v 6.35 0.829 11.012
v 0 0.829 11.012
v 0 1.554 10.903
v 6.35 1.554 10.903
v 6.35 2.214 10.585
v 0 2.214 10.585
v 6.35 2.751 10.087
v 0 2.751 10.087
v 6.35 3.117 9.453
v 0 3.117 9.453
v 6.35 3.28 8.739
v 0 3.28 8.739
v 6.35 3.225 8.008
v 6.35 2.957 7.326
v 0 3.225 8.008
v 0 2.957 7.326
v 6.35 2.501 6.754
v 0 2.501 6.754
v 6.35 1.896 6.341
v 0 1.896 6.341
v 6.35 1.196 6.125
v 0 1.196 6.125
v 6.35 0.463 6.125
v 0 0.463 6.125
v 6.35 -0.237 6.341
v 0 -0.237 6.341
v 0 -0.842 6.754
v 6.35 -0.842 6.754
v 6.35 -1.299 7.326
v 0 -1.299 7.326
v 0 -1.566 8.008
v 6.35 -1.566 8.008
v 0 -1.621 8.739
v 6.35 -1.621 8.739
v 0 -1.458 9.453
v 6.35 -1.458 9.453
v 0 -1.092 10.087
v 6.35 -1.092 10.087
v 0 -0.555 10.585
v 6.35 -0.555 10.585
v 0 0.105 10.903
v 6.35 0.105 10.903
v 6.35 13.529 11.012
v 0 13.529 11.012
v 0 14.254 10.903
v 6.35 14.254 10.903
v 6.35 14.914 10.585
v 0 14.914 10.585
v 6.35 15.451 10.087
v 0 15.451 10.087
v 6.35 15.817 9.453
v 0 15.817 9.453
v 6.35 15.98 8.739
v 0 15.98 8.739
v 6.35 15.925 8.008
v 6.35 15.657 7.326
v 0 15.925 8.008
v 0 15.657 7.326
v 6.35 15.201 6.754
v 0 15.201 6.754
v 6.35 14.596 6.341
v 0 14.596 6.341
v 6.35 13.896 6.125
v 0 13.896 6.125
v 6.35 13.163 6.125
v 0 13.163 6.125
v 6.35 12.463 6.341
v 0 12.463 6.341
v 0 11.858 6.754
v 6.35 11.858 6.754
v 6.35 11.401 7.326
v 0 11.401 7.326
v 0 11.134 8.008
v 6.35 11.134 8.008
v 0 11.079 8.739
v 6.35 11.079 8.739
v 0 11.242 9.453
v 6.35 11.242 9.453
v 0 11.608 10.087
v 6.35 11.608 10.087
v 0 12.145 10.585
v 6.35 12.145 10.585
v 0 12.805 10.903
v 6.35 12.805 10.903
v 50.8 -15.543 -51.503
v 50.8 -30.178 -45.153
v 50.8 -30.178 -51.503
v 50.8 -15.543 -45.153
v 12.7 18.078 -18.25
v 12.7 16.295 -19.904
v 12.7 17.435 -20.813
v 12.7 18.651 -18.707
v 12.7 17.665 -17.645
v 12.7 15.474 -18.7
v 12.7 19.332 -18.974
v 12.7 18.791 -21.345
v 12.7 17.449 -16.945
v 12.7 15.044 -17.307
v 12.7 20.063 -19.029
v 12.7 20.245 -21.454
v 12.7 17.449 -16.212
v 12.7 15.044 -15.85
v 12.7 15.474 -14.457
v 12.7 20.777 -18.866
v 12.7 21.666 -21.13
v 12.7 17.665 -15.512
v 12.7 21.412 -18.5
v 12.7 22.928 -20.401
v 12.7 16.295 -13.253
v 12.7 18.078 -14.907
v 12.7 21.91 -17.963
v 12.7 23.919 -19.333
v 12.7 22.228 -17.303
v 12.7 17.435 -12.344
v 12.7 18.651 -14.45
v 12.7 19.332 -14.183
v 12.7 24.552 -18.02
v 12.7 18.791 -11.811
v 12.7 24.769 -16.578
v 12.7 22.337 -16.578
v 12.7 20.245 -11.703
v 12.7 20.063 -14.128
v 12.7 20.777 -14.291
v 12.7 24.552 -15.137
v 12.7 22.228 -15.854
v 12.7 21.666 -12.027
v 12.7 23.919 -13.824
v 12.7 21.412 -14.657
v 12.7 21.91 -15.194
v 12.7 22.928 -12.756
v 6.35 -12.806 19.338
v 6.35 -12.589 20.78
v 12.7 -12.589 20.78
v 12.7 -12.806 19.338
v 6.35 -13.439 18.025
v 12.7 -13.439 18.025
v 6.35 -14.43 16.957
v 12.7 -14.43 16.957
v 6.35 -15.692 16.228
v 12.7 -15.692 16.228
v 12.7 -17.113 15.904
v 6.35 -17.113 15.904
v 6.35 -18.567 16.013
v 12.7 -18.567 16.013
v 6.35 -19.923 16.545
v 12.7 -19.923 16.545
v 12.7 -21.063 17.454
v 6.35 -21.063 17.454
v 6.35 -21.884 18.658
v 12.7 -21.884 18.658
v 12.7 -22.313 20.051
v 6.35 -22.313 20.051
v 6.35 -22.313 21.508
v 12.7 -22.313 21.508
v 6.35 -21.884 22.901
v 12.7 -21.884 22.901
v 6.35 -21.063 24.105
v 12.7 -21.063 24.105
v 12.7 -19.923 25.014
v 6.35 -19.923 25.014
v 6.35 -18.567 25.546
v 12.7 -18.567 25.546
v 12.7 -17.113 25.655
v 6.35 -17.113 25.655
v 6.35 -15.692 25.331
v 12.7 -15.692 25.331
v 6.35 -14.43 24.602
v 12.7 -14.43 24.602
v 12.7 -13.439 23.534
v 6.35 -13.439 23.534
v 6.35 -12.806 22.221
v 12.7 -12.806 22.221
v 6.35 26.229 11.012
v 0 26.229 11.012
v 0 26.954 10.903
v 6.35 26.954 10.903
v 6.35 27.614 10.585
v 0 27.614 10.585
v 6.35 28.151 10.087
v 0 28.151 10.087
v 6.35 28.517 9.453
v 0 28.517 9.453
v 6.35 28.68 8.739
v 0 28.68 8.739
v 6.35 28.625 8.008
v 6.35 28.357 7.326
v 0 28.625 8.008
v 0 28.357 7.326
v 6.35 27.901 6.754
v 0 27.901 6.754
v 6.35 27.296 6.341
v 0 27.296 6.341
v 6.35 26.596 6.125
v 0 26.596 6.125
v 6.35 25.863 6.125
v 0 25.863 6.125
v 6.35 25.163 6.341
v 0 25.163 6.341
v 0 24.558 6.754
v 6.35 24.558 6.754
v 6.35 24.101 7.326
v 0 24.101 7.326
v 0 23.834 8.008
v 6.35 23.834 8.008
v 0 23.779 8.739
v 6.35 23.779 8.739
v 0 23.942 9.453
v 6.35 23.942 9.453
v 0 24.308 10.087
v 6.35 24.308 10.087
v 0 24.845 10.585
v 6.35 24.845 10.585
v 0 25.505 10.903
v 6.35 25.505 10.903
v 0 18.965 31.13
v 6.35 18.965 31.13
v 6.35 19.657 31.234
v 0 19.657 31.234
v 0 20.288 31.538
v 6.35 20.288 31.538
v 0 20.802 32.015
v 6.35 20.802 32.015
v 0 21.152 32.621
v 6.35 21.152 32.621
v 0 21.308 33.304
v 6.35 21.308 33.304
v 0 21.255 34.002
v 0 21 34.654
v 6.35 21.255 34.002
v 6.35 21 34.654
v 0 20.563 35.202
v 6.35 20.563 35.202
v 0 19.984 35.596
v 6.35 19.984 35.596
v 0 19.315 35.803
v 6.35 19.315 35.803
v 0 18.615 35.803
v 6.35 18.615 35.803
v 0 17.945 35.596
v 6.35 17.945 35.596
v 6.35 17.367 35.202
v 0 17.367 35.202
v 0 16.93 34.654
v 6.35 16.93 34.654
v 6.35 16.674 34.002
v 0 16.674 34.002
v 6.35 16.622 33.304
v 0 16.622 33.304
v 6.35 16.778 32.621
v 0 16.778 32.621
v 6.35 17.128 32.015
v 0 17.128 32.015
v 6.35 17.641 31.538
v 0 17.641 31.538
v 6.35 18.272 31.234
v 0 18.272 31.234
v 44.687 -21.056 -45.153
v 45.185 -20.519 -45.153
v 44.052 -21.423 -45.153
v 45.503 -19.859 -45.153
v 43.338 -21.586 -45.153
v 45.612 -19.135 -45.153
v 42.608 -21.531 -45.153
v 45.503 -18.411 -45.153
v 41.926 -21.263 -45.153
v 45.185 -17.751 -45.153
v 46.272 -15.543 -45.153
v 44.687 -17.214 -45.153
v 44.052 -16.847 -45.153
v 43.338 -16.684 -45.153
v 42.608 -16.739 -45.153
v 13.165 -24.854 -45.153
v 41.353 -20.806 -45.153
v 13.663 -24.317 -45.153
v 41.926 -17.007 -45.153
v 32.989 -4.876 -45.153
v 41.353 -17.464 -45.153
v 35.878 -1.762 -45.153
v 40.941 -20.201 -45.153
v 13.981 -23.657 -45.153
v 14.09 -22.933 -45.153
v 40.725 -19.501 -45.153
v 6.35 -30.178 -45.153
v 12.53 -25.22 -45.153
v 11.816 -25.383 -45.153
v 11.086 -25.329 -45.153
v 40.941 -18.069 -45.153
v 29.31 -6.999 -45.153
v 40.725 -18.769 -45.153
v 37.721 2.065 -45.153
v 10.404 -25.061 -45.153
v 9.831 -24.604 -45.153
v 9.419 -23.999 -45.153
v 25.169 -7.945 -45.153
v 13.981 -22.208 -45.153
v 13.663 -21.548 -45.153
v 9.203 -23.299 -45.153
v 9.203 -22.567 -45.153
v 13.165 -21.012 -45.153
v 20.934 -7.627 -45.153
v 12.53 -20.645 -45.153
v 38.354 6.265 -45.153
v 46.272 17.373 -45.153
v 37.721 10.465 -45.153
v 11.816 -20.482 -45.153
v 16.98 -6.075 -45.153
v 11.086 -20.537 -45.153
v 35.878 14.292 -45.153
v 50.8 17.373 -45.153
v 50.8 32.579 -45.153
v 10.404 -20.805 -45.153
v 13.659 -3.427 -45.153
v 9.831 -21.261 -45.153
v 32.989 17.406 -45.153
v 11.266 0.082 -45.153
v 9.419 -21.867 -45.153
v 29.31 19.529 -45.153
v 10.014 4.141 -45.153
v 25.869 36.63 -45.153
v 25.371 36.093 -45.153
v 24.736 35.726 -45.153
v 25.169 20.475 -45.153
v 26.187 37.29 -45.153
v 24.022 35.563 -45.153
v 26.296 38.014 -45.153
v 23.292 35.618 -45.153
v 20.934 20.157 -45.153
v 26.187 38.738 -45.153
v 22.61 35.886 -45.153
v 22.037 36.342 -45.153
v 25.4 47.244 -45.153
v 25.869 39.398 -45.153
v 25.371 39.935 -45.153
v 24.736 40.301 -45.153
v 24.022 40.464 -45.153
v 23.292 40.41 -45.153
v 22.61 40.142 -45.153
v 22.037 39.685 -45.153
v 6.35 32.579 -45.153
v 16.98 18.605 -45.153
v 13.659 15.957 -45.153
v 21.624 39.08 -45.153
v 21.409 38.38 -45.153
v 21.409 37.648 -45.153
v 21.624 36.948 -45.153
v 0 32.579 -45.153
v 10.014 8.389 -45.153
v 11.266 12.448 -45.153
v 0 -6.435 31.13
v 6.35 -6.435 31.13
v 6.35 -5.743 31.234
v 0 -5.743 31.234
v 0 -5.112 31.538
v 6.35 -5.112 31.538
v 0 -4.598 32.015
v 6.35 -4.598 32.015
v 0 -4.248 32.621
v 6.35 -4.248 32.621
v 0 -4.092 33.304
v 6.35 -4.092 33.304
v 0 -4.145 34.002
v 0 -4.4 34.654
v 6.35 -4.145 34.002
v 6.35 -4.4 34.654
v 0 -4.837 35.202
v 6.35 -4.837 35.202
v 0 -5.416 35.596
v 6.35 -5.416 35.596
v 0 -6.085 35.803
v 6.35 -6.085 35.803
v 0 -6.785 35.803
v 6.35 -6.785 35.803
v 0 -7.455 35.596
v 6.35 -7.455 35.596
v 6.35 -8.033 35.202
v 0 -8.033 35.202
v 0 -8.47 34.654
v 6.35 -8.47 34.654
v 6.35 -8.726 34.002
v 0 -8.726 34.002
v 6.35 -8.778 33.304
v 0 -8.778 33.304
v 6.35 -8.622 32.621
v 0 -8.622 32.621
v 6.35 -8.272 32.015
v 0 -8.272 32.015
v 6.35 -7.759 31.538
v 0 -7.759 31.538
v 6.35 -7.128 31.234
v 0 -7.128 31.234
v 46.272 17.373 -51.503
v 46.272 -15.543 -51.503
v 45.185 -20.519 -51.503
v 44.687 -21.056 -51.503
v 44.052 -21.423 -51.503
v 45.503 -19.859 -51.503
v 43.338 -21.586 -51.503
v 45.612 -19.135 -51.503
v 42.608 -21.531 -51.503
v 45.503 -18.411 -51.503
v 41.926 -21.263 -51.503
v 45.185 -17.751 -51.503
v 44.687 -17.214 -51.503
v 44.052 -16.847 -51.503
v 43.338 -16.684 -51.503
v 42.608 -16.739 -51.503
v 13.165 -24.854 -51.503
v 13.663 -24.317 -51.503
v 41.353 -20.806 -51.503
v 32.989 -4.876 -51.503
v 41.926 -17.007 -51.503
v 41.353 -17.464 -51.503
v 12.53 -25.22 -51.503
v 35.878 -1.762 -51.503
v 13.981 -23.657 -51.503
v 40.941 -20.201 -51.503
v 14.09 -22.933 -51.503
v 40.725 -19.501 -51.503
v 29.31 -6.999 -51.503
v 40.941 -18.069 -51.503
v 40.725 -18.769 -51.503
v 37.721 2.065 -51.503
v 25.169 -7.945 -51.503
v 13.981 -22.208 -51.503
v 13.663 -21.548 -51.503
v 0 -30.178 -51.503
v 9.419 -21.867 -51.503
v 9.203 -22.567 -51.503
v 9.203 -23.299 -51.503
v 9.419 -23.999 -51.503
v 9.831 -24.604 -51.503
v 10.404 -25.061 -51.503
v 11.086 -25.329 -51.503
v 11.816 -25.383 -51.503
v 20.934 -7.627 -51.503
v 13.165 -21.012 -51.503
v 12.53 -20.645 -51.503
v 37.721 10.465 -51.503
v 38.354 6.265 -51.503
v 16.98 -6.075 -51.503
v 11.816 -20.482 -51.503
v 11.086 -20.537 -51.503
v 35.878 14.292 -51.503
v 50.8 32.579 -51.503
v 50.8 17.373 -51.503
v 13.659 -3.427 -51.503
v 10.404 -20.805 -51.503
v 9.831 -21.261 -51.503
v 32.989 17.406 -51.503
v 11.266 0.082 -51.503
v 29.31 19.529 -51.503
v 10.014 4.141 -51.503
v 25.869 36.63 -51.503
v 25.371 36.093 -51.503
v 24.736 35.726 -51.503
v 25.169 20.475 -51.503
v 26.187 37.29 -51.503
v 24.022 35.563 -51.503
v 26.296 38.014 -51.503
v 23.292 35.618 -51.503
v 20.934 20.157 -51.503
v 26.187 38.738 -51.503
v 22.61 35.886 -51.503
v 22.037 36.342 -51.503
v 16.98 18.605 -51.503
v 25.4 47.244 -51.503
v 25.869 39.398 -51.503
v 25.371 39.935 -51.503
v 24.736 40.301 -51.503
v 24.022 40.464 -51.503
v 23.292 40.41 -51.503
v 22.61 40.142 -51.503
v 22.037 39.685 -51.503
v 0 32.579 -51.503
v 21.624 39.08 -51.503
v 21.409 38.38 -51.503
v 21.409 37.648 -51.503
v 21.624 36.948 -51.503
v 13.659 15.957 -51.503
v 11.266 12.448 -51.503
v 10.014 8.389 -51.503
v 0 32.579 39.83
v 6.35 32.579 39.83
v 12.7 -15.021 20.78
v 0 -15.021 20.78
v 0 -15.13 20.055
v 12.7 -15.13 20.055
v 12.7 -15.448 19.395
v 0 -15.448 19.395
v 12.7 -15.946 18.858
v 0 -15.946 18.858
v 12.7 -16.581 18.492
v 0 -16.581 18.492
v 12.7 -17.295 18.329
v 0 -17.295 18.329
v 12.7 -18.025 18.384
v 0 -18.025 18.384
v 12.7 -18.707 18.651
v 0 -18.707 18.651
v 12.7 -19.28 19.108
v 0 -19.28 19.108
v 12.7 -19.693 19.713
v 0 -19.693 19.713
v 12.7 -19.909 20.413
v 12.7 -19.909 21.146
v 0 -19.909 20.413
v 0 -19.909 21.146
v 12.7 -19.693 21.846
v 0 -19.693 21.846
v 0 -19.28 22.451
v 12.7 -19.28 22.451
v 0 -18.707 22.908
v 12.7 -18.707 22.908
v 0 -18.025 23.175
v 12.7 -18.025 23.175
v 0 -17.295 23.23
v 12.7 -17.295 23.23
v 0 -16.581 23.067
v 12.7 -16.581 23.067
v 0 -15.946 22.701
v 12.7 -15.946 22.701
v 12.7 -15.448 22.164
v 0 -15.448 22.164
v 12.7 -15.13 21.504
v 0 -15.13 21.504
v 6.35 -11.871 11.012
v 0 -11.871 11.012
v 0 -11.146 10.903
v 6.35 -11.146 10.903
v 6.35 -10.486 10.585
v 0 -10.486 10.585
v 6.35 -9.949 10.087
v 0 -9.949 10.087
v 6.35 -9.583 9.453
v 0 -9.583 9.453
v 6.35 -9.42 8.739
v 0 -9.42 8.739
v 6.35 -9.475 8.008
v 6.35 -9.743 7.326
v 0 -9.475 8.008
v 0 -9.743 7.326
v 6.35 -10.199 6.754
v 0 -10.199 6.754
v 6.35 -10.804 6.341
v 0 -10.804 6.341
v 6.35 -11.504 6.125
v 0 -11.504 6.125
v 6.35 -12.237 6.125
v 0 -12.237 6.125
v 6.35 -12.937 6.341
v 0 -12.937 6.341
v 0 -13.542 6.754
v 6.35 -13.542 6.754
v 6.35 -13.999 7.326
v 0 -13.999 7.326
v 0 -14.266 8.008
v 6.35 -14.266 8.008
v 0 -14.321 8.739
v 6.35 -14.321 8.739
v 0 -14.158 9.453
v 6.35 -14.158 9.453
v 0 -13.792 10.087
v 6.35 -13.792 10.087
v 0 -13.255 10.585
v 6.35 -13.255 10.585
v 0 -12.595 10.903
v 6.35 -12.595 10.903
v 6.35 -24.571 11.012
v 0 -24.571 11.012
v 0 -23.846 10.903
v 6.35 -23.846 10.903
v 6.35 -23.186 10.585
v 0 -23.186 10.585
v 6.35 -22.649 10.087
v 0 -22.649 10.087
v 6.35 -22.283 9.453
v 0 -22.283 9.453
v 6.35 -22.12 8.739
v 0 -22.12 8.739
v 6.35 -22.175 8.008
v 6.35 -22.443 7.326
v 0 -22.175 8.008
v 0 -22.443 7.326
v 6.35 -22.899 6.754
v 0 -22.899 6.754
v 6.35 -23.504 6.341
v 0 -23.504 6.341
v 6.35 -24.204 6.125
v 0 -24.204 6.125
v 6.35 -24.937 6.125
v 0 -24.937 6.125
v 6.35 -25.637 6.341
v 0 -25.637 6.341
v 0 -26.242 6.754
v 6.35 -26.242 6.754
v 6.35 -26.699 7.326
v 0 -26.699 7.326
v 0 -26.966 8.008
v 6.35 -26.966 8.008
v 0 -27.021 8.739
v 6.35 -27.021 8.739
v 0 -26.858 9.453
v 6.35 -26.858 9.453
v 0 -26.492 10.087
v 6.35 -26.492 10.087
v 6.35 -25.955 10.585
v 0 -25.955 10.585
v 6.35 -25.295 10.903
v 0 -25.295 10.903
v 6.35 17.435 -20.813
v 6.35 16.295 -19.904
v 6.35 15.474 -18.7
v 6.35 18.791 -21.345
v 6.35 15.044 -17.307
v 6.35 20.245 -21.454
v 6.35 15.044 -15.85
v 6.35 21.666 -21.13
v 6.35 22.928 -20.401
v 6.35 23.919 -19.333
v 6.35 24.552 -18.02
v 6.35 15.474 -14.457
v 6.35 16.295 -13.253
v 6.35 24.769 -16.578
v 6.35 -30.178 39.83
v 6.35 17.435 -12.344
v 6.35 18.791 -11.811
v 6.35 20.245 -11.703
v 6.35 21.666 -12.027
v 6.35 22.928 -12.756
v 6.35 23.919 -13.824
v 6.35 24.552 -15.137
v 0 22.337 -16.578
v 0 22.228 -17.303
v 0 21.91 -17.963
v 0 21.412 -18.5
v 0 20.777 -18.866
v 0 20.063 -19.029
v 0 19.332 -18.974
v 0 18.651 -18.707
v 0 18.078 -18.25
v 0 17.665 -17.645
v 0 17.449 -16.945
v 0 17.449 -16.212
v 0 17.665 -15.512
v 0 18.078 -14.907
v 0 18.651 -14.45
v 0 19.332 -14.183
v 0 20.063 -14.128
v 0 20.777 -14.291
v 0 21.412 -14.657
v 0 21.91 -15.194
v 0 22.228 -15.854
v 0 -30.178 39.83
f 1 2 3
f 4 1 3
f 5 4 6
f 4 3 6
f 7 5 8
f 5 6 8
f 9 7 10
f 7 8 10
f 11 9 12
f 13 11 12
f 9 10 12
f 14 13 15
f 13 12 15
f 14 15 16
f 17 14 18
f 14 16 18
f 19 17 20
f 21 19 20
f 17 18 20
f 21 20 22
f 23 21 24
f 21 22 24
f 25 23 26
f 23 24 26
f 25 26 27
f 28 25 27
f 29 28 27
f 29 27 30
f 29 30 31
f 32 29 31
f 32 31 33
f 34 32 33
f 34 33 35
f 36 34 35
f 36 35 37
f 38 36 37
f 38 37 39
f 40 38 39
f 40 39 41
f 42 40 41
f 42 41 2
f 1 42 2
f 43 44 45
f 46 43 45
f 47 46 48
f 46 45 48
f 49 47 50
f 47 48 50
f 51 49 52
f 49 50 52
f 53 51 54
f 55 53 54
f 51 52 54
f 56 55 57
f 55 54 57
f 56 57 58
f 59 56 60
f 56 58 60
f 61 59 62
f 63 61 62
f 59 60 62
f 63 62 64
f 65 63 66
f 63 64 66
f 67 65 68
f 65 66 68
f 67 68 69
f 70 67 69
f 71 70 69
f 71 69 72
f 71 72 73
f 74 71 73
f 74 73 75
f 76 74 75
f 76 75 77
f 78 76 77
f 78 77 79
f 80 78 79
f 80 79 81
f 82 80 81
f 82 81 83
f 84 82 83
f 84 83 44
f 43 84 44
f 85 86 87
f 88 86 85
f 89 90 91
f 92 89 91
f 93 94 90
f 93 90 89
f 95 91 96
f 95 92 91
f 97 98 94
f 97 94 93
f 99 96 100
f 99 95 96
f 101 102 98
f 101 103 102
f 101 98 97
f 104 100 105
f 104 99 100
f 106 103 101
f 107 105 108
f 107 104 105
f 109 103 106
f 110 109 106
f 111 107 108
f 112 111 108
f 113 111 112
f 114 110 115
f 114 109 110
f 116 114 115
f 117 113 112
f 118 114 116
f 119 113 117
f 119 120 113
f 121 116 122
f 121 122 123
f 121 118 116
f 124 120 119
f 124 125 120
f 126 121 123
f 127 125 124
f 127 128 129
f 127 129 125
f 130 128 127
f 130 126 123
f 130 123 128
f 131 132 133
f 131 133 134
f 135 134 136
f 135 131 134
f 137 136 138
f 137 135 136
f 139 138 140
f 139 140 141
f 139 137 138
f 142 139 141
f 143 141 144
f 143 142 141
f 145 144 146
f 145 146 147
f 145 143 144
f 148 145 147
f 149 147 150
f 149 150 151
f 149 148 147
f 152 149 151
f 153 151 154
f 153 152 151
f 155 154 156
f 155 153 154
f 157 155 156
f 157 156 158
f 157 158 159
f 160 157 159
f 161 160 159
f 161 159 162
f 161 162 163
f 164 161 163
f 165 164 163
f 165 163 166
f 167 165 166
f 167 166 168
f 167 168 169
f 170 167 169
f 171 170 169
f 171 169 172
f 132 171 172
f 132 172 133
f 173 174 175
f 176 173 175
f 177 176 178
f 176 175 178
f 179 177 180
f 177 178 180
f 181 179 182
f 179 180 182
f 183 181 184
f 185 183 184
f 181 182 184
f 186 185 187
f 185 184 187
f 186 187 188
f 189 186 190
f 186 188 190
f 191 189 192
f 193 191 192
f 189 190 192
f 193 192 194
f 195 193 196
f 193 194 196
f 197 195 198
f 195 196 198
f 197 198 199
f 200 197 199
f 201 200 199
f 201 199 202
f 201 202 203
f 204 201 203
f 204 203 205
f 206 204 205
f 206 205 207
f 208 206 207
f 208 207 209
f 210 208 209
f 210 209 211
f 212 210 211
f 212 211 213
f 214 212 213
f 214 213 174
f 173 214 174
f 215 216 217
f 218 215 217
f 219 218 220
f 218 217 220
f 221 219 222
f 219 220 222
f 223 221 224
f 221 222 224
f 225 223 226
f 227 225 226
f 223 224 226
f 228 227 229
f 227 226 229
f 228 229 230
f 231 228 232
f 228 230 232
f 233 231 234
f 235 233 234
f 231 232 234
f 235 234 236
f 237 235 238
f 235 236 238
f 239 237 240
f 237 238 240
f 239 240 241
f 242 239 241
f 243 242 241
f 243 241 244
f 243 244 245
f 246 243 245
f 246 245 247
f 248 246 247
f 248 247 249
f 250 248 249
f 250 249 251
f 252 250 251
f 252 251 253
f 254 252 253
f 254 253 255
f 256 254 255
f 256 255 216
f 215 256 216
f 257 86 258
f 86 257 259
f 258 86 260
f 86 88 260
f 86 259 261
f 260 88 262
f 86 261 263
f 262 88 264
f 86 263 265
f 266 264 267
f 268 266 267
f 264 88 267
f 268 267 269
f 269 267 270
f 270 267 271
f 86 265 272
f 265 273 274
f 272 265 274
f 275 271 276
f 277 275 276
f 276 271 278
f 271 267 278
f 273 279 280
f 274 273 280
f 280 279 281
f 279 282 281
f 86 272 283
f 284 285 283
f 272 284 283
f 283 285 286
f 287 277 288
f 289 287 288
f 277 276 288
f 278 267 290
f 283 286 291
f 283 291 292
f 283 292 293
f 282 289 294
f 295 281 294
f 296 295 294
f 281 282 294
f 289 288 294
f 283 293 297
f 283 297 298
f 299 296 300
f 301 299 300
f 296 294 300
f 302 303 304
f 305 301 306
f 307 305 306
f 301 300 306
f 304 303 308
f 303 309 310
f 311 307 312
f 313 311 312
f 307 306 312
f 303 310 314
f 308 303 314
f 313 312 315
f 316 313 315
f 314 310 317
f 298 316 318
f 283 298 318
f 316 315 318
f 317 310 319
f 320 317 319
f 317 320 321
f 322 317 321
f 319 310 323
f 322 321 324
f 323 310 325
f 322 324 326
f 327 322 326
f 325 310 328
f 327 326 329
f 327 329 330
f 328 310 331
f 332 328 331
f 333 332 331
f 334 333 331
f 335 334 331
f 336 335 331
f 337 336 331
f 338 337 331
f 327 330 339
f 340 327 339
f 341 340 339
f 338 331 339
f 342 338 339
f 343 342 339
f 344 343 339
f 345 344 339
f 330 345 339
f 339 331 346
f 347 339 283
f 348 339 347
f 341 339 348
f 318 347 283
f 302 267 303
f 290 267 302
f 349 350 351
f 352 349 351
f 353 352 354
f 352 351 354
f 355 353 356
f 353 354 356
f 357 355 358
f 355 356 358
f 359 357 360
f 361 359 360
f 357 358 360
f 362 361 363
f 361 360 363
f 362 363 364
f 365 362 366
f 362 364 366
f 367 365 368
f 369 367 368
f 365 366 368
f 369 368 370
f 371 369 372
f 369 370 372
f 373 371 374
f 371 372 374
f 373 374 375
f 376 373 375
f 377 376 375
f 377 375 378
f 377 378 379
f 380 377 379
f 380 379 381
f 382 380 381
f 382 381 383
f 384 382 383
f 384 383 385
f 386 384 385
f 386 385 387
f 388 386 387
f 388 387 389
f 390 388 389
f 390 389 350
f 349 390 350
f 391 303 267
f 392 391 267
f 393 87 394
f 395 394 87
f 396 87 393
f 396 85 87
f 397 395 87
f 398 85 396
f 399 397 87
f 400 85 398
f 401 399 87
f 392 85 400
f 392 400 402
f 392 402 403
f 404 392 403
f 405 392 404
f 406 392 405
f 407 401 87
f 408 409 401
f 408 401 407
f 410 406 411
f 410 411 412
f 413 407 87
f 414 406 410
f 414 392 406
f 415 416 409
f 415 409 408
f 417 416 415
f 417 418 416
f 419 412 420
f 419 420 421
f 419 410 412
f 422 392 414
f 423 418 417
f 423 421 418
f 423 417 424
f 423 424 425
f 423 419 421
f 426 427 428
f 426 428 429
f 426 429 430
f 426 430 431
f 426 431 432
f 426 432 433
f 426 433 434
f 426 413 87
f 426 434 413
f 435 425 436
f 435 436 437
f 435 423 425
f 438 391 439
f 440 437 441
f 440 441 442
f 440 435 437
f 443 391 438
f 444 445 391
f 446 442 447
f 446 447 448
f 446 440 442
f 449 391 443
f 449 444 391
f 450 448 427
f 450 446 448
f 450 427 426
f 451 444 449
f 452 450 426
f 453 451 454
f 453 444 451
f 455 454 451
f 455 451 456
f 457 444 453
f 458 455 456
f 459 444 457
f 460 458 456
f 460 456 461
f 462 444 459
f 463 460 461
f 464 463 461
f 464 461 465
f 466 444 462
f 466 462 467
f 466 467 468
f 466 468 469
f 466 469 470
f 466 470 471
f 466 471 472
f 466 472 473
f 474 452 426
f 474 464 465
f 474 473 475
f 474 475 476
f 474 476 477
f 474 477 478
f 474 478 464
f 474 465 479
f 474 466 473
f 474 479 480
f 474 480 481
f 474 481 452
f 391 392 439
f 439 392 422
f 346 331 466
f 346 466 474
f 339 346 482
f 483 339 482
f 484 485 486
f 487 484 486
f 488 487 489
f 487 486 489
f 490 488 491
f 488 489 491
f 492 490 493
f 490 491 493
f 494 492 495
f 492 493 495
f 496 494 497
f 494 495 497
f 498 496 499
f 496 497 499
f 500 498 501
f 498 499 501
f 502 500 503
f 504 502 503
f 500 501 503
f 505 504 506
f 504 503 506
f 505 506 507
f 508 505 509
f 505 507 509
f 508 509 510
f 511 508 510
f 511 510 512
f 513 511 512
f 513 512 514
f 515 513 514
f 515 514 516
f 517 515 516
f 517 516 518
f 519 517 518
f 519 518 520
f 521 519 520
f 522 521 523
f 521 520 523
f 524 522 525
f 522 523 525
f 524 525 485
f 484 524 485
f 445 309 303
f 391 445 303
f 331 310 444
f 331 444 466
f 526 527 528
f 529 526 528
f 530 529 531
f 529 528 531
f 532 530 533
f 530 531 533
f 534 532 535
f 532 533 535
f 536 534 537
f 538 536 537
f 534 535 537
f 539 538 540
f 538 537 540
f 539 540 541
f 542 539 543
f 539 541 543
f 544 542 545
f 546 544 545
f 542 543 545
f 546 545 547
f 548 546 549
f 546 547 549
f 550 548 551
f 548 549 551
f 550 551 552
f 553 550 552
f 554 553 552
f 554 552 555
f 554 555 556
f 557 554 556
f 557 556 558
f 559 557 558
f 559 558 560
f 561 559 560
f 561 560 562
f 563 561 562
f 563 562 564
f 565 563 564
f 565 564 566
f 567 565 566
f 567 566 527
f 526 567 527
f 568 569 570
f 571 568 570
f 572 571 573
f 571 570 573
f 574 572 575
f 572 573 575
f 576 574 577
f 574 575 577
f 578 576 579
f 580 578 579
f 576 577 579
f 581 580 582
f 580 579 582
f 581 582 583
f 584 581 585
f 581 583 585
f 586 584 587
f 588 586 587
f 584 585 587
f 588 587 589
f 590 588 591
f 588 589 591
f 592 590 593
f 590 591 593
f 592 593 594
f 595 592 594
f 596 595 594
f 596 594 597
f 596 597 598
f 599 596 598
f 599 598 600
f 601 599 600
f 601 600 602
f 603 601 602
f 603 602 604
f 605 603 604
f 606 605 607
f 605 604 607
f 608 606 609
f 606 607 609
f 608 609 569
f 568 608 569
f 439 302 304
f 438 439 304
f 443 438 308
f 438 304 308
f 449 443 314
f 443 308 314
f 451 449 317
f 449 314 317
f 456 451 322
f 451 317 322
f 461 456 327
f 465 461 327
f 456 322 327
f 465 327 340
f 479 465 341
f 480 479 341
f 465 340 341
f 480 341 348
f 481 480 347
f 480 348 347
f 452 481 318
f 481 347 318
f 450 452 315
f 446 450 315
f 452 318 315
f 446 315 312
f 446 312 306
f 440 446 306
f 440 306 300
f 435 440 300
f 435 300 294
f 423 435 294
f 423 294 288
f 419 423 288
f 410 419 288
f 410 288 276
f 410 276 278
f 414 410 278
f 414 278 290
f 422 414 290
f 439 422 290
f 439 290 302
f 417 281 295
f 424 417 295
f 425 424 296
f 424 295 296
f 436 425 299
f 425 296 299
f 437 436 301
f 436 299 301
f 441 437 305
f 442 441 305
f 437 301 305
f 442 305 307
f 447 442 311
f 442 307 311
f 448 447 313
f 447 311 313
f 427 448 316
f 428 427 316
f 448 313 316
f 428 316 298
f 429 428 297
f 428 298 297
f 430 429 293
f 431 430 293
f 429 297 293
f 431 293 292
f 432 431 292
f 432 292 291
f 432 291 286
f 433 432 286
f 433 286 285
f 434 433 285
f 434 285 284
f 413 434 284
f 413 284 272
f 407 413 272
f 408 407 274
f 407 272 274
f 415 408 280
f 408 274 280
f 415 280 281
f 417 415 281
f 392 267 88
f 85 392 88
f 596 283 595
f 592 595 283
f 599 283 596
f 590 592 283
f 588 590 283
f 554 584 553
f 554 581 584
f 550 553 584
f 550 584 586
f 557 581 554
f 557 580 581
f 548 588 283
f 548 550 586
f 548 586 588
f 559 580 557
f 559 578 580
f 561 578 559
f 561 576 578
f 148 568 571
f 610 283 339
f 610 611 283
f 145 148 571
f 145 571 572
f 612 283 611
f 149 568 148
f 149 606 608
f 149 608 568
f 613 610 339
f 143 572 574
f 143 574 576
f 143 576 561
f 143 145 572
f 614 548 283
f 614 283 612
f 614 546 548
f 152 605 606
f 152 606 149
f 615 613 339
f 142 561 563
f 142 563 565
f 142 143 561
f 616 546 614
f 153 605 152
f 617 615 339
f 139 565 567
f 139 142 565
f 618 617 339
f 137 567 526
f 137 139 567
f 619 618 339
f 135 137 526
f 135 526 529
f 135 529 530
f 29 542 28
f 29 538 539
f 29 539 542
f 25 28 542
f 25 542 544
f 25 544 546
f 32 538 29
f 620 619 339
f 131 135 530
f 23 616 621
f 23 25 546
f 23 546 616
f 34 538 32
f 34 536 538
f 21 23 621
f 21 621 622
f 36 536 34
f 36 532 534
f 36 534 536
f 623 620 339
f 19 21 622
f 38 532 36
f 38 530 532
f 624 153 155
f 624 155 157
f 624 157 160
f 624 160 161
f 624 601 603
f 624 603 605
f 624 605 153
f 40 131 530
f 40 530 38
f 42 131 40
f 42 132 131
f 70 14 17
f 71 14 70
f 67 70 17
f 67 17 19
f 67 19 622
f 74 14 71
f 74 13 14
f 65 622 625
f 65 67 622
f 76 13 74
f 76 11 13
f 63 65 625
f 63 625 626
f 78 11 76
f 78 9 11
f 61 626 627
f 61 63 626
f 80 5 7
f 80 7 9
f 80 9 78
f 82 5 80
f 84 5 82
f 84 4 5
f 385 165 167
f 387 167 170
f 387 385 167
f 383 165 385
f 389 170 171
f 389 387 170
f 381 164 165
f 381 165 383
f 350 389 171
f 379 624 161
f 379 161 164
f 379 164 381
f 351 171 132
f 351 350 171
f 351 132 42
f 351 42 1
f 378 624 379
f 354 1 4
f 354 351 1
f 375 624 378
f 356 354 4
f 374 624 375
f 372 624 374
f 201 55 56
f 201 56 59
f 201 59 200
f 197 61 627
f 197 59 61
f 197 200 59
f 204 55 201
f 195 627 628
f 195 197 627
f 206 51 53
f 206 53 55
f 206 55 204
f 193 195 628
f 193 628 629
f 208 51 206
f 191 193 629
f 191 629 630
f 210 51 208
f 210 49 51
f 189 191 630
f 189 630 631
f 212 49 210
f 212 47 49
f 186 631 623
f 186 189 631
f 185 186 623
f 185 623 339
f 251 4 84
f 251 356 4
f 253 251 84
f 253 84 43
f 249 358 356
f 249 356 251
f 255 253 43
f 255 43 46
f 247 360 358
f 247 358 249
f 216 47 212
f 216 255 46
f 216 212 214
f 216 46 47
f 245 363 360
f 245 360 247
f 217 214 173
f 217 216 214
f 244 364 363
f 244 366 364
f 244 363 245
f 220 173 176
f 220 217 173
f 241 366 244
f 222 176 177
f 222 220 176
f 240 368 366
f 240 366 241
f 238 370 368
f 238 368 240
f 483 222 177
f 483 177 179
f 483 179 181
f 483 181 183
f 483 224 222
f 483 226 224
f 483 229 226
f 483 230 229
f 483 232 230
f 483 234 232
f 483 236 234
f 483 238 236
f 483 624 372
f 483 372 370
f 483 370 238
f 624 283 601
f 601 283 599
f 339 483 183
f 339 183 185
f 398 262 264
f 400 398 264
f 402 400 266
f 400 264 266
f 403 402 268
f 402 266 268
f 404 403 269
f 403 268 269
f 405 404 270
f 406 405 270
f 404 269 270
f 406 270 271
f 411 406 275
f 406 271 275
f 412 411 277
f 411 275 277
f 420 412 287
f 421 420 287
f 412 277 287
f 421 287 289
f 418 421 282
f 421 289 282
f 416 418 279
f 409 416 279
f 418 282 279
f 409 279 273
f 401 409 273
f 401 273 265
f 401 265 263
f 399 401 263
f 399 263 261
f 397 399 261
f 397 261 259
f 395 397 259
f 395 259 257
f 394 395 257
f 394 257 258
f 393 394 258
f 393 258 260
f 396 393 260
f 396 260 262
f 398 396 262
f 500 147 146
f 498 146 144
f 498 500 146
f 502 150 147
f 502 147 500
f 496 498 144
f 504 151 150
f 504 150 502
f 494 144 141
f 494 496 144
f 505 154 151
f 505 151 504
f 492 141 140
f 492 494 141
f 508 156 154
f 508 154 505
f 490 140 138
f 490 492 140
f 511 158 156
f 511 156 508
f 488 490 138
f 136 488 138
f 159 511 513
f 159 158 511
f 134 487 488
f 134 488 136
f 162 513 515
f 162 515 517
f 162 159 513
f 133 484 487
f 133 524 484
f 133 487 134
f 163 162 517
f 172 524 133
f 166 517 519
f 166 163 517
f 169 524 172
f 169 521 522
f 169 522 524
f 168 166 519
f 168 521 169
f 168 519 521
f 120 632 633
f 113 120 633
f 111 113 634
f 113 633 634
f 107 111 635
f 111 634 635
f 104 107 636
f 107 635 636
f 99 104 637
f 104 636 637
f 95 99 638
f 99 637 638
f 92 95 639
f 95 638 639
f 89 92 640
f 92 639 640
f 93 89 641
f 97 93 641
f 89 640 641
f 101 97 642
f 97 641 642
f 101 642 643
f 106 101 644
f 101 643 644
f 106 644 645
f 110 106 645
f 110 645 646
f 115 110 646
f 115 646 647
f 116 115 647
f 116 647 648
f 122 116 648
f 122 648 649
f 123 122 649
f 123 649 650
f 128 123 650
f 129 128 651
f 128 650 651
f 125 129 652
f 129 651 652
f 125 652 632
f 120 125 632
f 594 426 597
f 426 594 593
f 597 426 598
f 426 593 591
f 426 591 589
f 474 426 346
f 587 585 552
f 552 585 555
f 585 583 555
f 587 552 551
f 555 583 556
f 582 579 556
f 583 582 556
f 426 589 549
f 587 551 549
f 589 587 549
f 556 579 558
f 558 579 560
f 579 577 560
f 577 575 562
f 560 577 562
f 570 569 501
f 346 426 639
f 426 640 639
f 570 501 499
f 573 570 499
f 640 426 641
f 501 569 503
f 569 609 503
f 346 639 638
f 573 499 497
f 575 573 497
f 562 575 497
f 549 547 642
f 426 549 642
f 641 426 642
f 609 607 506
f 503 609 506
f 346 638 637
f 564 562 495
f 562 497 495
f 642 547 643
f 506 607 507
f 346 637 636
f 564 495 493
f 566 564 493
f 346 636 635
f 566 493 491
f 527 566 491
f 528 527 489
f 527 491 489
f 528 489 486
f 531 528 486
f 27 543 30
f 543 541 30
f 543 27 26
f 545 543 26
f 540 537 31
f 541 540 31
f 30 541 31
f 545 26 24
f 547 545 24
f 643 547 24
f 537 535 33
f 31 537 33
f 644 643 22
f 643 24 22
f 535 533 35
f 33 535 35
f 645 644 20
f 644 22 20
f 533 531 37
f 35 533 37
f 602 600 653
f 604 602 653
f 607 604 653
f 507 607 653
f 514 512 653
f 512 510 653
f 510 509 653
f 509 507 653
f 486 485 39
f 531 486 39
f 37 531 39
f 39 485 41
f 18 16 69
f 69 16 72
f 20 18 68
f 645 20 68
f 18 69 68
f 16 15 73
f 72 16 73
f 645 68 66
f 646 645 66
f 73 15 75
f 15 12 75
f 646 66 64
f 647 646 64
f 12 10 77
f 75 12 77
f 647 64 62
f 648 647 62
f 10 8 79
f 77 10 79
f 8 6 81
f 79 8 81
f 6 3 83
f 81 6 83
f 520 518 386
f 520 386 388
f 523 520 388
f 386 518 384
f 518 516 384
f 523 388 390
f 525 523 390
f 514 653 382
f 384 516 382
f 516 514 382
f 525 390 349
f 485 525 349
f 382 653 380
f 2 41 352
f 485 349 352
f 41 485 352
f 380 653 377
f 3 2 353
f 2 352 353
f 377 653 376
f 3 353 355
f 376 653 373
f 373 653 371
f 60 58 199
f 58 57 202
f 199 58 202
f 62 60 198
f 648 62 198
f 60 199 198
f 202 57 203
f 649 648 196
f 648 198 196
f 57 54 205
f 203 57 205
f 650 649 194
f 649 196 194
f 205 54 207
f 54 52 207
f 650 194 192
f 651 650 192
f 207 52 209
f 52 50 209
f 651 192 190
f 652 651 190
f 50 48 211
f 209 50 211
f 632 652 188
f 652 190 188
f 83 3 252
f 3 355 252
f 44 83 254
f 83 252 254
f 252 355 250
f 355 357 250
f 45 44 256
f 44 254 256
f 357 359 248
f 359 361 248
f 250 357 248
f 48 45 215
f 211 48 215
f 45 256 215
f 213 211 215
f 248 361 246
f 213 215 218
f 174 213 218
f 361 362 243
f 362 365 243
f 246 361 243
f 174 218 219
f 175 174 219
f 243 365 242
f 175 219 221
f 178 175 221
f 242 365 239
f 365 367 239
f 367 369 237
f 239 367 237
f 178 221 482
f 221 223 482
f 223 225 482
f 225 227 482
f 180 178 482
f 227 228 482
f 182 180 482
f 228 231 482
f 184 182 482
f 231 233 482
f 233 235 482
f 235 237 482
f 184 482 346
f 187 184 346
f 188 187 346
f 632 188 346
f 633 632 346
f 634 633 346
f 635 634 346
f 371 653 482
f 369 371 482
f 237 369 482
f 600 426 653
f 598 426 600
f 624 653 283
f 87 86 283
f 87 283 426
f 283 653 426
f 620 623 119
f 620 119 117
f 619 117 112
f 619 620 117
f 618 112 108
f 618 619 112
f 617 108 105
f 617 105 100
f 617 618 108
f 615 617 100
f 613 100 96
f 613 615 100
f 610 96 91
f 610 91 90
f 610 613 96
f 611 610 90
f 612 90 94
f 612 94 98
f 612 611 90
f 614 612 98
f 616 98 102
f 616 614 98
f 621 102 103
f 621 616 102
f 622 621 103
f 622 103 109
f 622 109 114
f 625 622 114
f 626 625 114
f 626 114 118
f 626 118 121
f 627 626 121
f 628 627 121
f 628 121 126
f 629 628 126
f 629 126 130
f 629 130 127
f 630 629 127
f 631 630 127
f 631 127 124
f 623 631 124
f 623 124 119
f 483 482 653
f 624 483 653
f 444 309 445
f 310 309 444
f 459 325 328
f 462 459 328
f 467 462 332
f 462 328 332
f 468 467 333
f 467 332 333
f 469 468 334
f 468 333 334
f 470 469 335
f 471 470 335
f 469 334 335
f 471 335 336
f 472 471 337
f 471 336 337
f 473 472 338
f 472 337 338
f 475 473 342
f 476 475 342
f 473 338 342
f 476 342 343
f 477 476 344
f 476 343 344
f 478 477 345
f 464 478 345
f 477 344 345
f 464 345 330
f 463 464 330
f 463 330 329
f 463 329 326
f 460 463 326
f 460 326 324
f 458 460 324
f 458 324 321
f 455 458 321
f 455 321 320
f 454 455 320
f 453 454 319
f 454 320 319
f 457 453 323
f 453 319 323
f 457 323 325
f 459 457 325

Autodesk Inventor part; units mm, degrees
ref_plane "YZ Plane" through (0, 0, 0) normal (1, 0, 0) x (0, 1, 0)
ref_plane "XZ Plane" through (0, 0, 0) normal (0, 1, 0) x (-1, 0, 0)
ref_plane "XY Plane" through (0, 0, 0) normal (0, 0, 1) x (1, 0, 0)
sketch "Sketch1" plane through (0, 0, 0) normal (1, 0, 0) x (0, 1, 0)
  line L0 (19.8793, 20.7795) -> (-17.4785, 20.7795)
  line L1 (-17.4785, 20.7795) -> (-17.4785, -16.5784)
  line L2 (-17.4785, -16.5784) -> (19.8793, -16.5784)
  line L3 (19.8793, -16.5784) -> (19.8793, 20.7795)
  circle A0 centre (19.8793, 20.7795) radius 4.8895
  circle A1 centre (19.8793, -16.5784) radius 4.8895
  circle A2 centre (-17.4785, -16.5784) radius 4.8895
  circle A3 centre (-17.4785, 20.7795) radius 4.8895
  line L4 (32.5793, 39.8295) -> (-30.1785, 39.8295)
  line L5 (-30.1785, 39.8295) -> (-30.1785, -45.1534)
  line L6 (-30.1785, -45.1534) -> (32.5793, -45.1534)
  line L7 (32.5793, -45.1534) -> (32.5793, 39.8295)
  circle A4 centre (19.8793, 20.7795) radius 2.4575
  circle A5 centre (19.8793, -16.5784) radius 2.4575
  circle A6 centre (-17.4785, -16.5784) radius 2.4575
  circle A7 centre (-17.4785, 20.7795) radius 2.4575
  point P0 (0, 0)
  dimension "d0" = 9.779
  dimension "d4" = 52.832
  dimension "d5" = 12.7
  dimension "d6" = 19.05
  dimension "d7" = 12.7
  dimension "d8" = 28.575
  dimension "d13" = 4.9149
extrude "Extrusion1" add sketch "Sketch1" along normal blind 6.35 contours A3 L1 A7 L0 | L0 A7 L1 A3 | L0 A0 L3 A1 L2 A2 L1 A3 | A7 L1 L0 | L0 L1 A7 | A0 L3 A4 L0 | L0 A4 L3 A0 | A4 L3 L0 | L0 L3 A4 | A2 L2 A6 L1 | L1 A6 L2 A2 | A1 L2 A5 L3 | L3 A5 L2 A1 | A6 L2 L1 | L1 L2 A6 | A5 L2 L3 | L3 L2 A5 | L7 L6 L5 L4
extrude "Extrusion2" add sketch "Sketch1" along normal blind 12.7 contours A3 L1 A7 L0 | L0 A7 L1 A3 | A7 L1 L0 | L0 L1 A7 | A1 L2 A5 L3 | L3 A5 L2 A1 | A5 L2 L3 | L3 L2 A5
extrude "Extrusion3" cut sketch "Sketch1" along normal blind 12.7 contours A7 L1 L0 | L0 L1 A7 | A5 L2 L3 | L3 L2 A5
sketch "Sketch2" plane through (0, -30.1785, -45.1534) normal (0, 0, -1) x (-1, 0, 0)
  line L0 (0, 0) -> (-6.35, 0) projected
  line L1 (0, 0) -> (-50.8, 0)
  line L2 (-50.8, 0) -> (-50.8, 62.7579)
  line L3 (-50.8, 62.7579) -> (0, 62.7579)
  line L4 (0, 62.7579) -> (0, 0)
  line L5 (0, 62.7579) -> (-6.35, 62.7579) projected
  line L6 (-50.8, 62.7579) -> (-25.4, 77.4226)
  line L7 (-25.4, 77.4226) -> (0, 62.7579)
  line L8 (-50.8, 62.7579) -> (0, 62.7579)
  point P0 (0, 30.1785)
  dimension "d16" = 50.8
  dimension "d89" = 30
  dimension "d90" = 30
extrude "Extrusion4" add sketch "Sketch2" along normal blind 6.35
sketch "Sketch4" plane through (0, 32.5793, 39.8295) normal (0, 1, 0) x (1, 0, 0)
  line L0 (0, 84.9829) -> (0, 0) projected
  line L1 (0, 0) -> (6.35, 0) projected
  line L2 (6.35, 84.9829) -> (6.35, 0) projected
  line L3 (0, 78.6329) -> (6.35, 78.6329)
  line L4 (6.35, 78.6329) -> (6.35, 129.4329)
  line L5 (6.35, 129.4329) -> (0, 129.4329)
  line L6 (0, 129.4329) -> (0, 78.6329)
  line L7 (6.35, 129.4329) -> (50.8, 129.4329)
  line L8 (50.8, 129.4329) -> (50.8, 123.0829)
  line L9 (50.8, 123.0829) -> (6.35, 123.0829)
  line L10 (6.35, 123.0829) -> (6.35, 129.4329)
  line L11 (0, 84.9829) -> (6.35, 84.9829) projected
  point P0 (0, 39.8295)
  dimension "d25" = 6.35
  dimension "d26" = 50.8
  dimension "d27" = 6.35
sketch "Sketch3" plane through (0, -30.1785, -45.1534) normal (0, 0, 1) x (1, 0, 0)
  circle A0 centre (24.1046, 36.4435) radius 9.7536
  line L0 (6.35, 62.7579) -> (6.35, 0) projected
  circle A1 centre (24.1046, 36.4435) radius 14.2494
  line L1 (6.35, 0) -> (50.8, 0) projected
  point P0 (0, 30.1785)
  dimension "d19" = 19.5072
  dimension "d20" = 17.7546
  dimension "d22" = 28.4988
  dimension "d91" = 36.4435
extrude "Extrusion5" cut sketch "Sketch3" against normal blind 63.5 contours A0 | A1
sketch "Sketch5" plane through (0, -30.1785, -45.1534) normal (0, 0, 1) x (1, 0, 0)
  circle A0 centre (24.1046, 36.4435) radius 14.2494 projected
  circle A1 centre (23.8385, 68.1924) radius 2.4574
  circle A2 centre (43.1546, 11.0435) radius 2.4574
  circle A3 centre (11.6326, 7.2457) radius 2.4574
  point P0 (0, 30.1785)
  dimension "d33" = 4.9149
  dimension "d46" = 31.75
  dimension "d47" = 31.75
  dimension "d48" = 31.75
  dimension "d49" = 31.75
  dimension "d50" = 60.325
  dimension "d51" = 25.4
extrude "Extrusion7" cut sketch "Sketch5" against normal blind 25.4 contours A1 | A2 | A3
ref_plane "Work Plane1" through (-9.525, -30.1785, 2.2051) normal (-1, 0, 0) x (0, 0, 1)
sketch "Sketch10" plane through (0, 0, 0) normal (-1, 0, 0) x (0, 0, 1)
  line L0 (14.9051, -30.1785) -> (14.9051, 32.5793) projected
  line L1 (14.9051, 32.5793) -> (2.2051, 32.5793) projected
  circle A0 centre (8.5551, 26.2293) radius 2.4574
  circle A1 centre (8.5551, 13.5293) radius 2.4574
  circle A2 centre (8.5551, 0.8293) radius 2.4574
  circle A3 centre (8.5551, -11.8707) radius 2.4574
  circle A4 centre (8.5551, -24.5707) radius 2.4574
  point P0 (0, 0)
  dimension "d77" = 4.9149
  dimension "d78" = 6.35
  dimension "d79" = 6.35
  dimension "d82" = 12.7
extrude "Extrusion12" cut sketch "Sketch10" against normal blind 25.4
sketch "Sketch11" plane through (0, -30.1785, -45.1534) normal (0, 0, 1) x (1, 0, 0)
  line L0 (52.0296, 47.0435) -> (52.0296, 15.1435)
  line L1 (46.7796, 15.1435) -> (46.7796, 47.0435)
  line L2 (52.0296, 15.1435) -> (46.7796, 15.1435)
  line L3 (46.7796, 47.0435) -> (52.0296, 47.0435)
  line L4 (46.2716, 47.5515) -> (46.2716, 14.6355)
  line L5 (46.2716, 14.6355) -> (52.5376, 14.6355)
  line L6 (52.5376, 14.6355) -> (52.5376, 47.5515)
  line L7 (52.5376, 47.5515) -> (46.2716, 47.5515)
  point P0 (0, 30.1785)
  dimension "d92" = 0.508
extrude "Extrusion13" cut sketch "Sketch11" against normal blind 25.4 contours L0 L2 L1 L3 | L7 L6 L5 L4
sketch "Sketch12" plane through (6.35, 0, 0) normal (1, 0, 0) x (0, 0, -1)
  line L0 (51.5034, 20.5143) -> (51.5034, -7.9845) projected
  line L1 (45.1534, -7.9845) -> (45.1534, 20.5143) projected
  line L2 (45.1534, 6.2649) -> (-81.3629, 6.2649)
  circle A0 centre (-33.4795, 18.9649) radius 2.3495
  circle A1 centre (-33.4795, -6.4351) radius 2.3495
  line L3 (-39.8295, 32.5793) -> (-39.8295, -30.1785) projected
  point P0 (0, 0)
  dimension "d95" = 4.699
  dimension "d96" = 4.699
  dimension "d97" = 12.7
  dimension "d98" = 12.7
  dimension "d99" = 6.35
extrude "Extrusion14" cut sketch "Sketch12" against normal blind 25.4
equation "\"d90\" = d89"
equation "\"d27\" = d25"
equation "\"d1\" = d0"
properties part number "motor mount 2" material "ABS Plastic"
